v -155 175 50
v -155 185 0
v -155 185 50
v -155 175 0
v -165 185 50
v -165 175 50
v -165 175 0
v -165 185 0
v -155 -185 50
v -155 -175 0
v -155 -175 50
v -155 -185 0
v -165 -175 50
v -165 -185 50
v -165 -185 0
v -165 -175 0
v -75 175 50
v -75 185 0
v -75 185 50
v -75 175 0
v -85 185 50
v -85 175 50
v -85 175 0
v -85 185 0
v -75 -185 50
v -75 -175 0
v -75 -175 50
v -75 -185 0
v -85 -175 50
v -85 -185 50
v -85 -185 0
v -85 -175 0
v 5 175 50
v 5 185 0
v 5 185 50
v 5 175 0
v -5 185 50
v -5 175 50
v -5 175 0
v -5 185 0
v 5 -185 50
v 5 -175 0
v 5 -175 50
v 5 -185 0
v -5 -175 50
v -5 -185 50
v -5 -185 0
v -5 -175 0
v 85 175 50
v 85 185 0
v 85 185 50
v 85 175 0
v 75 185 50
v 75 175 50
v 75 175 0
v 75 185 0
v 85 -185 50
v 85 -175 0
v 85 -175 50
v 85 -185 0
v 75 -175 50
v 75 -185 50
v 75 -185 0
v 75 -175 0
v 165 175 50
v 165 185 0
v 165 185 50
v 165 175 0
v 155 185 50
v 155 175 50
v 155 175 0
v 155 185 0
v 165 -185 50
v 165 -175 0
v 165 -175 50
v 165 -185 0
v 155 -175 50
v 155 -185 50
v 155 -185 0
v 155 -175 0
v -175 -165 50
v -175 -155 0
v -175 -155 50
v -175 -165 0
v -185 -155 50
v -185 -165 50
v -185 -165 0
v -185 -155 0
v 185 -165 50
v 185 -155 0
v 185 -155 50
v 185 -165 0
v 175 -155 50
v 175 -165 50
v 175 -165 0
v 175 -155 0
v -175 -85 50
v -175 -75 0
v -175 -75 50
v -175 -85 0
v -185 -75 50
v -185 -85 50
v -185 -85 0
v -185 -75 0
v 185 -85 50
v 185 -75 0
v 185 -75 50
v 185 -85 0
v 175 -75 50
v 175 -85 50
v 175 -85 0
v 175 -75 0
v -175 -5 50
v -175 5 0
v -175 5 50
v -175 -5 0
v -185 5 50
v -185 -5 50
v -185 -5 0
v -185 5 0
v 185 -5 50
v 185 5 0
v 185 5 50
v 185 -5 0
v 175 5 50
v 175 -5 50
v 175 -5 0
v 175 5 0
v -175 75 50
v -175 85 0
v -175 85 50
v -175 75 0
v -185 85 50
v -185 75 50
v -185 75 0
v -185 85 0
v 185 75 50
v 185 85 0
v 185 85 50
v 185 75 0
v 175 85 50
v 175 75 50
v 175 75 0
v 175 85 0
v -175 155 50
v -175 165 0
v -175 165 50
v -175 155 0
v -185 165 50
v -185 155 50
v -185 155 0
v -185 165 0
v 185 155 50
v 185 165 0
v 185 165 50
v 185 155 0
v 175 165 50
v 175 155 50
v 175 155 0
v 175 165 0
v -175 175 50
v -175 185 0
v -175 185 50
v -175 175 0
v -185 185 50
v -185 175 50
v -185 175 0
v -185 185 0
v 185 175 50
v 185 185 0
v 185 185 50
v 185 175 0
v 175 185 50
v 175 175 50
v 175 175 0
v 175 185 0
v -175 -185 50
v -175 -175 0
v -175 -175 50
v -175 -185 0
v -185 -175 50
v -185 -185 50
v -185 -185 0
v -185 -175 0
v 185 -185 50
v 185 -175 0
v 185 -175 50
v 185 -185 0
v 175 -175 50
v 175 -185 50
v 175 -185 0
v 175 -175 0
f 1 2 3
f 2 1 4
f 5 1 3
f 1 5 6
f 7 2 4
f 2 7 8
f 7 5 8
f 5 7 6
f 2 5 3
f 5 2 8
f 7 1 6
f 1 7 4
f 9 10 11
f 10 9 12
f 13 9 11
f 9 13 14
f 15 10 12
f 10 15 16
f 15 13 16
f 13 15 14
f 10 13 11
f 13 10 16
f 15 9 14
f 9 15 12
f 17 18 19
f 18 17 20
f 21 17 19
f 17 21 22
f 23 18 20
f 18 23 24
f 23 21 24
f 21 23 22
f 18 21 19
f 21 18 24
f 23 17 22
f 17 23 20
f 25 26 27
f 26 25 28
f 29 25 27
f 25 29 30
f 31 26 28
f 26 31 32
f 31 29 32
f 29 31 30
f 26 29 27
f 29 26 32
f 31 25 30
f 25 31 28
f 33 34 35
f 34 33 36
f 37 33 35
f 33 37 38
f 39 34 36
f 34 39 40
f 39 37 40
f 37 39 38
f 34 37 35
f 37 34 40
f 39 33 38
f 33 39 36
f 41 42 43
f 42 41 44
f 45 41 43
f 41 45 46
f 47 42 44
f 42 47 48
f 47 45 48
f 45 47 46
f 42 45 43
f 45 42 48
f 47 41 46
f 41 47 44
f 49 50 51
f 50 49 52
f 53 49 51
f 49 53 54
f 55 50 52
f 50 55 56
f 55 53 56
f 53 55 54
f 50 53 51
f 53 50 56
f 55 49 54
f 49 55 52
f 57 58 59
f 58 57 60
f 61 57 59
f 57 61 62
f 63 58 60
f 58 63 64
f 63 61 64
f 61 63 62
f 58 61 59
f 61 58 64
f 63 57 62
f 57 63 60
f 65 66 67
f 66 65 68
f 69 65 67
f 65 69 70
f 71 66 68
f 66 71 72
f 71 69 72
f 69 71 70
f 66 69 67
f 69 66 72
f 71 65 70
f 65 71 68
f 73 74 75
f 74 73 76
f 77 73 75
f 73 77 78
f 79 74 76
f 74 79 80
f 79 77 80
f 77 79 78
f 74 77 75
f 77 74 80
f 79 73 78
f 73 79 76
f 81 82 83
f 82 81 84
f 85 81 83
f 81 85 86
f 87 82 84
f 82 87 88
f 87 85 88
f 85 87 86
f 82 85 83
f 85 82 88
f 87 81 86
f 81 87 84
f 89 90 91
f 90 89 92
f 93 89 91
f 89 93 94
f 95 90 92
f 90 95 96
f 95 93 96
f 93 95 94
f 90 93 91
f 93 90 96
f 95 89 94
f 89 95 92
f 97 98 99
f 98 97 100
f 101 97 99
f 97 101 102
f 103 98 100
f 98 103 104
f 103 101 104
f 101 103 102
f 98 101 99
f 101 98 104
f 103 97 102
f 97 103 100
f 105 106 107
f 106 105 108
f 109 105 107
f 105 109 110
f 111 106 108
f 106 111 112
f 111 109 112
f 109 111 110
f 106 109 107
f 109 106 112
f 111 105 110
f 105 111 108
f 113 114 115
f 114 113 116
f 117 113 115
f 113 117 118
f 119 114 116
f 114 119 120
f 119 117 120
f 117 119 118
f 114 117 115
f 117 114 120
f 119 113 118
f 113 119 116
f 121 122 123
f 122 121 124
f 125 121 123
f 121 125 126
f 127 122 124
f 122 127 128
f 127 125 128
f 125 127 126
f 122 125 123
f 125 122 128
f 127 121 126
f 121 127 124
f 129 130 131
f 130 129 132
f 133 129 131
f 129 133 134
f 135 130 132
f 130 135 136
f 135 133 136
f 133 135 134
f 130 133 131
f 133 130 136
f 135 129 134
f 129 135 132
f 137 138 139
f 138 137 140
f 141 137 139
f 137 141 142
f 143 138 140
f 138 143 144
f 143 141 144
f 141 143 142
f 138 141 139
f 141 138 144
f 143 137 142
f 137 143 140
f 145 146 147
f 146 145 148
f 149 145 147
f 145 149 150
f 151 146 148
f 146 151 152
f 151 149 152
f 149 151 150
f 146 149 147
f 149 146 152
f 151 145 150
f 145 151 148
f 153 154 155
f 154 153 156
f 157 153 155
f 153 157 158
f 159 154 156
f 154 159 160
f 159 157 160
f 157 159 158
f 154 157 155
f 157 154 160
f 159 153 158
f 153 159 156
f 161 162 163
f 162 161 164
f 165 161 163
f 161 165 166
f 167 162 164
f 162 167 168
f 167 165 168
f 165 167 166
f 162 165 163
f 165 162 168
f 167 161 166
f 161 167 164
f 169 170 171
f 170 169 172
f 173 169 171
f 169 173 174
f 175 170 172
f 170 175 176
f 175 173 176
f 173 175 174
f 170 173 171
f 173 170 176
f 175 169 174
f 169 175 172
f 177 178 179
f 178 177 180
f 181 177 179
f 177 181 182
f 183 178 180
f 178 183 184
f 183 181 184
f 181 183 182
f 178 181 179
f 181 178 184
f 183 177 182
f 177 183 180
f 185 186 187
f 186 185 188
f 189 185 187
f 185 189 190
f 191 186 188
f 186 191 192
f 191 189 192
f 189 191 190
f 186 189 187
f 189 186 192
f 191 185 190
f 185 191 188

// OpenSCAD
// Cage slice 2
// Internal cavity: 350 x 350 x 700 mm
// Bar thickness: 10 mm (square)
// Gap between bars: 70 mm (uniform)
// Slice index: 2, slice Z range: [100, 150] (local coordinates 0..50)
// This file places the slice with its bottom on Z=0; when assembling, translate in Z by 100 mm.
// Export to STL with OpenSCAD: Render -> Export as STL.

bar = 10;
gap = 70;
s = bar + gap;
$fn = 64;  // cylinder resolution

x_centers = [-160, -80, 0, 80, 160];
y_centers = [-160, -80, 0, 80, 160];
z_centers = [5, 85, 165, 245, 325, 405, 485, 565, 645];

slice_index = 2;
slice_h = 50;

front_y = 180;
back_y = -180;
left_x = -180;
right_x = 180;
panel_length = 370;

hole_diam = 6.6;

module slice() {
    union() {
        // vertical bars on front and back (along Z)
        for (x = x_centers) {
            translate([x, front_y, slice_h/2]) cube([bar, bar, slice_h], center=true);
            translate([x, back_y, slice_h/2])  cube([bar, bar, slice_h], center=true);
        }
        // vertical bars on left and right (along Z)
        for (y = y_centers) {
            translate([left_x, y, slice_h/2])  cube([bar, bar, slice_h], center=true);
            translate([right_x, y, slice_h/2]) cube([bar, bar, slice_h], center=true);
        }
        // explicit corner vertical bars (ensure 4 corners for M6 rods)
        translate([-180, 180, slice_h/2]) cube([bar, bar, slice_h], center=true);
        translate([180, 180, slice_h/2]) cube([bar, bar, slice_h], center=true);
        translate([-180, -180, slice_h/2]) cube([bar, bar, slice_h], center=true);
        translate([180, -180, slice_h/2]) cube([bar, bar, slice_h], center=true);

        // horizontal bars (10 mm thick in Z) that lie inside this slice
        for (zc = z_centers) {
            z_local = zc - slice_index*slice_h;
            // include this horizontal bar if its center lies within this slice and it fits entirely here
            if (z_local >= bar/2 && z_local <= slice_h - bar/2) {
                // front and back horizontal bars (run along X)
                translate([0, front_y, z_local]) cube([panel_length, bar, bar], center=true);
                translate([0, back_y,  z_local]) cube([panel_length, bar, bar], center=true);
                // left and right horizontal bars (run along Y)
                translate([left_x, 0, z_local]) cube([bar, panel_length, bar], center=true);
                translate([right_x,0, z_local]) cube([bar, panel_length, bar], center=true);
            }
        }
    }
}

difference() {
    slice();
    // four vertical holes for M6 rods through corner bars (slightly longer than slice to ensure clean subtraction)
    translate([-180, 180, slice_h/2]) rotate([0,0,0]) cylinder(h = slice_h*4, r = hole_diam/2, center=true);
    translate([180, 180, slice_h/2]) rotate([0,0,0]) cylinder(h = slice_h*4, r = hole_diam/2, center=true);
    translate([-180, -180, slice_h/2]) rotate([0,0,0]) cylinder(h = slice_h*4, r = hole_diam/2, center=true);
    translate([180, -180, slice_h/2]) rotate([0,0,0]) cylinder(h = slice_h*4, r = hole_diam/2, center=true);
}

slice();
